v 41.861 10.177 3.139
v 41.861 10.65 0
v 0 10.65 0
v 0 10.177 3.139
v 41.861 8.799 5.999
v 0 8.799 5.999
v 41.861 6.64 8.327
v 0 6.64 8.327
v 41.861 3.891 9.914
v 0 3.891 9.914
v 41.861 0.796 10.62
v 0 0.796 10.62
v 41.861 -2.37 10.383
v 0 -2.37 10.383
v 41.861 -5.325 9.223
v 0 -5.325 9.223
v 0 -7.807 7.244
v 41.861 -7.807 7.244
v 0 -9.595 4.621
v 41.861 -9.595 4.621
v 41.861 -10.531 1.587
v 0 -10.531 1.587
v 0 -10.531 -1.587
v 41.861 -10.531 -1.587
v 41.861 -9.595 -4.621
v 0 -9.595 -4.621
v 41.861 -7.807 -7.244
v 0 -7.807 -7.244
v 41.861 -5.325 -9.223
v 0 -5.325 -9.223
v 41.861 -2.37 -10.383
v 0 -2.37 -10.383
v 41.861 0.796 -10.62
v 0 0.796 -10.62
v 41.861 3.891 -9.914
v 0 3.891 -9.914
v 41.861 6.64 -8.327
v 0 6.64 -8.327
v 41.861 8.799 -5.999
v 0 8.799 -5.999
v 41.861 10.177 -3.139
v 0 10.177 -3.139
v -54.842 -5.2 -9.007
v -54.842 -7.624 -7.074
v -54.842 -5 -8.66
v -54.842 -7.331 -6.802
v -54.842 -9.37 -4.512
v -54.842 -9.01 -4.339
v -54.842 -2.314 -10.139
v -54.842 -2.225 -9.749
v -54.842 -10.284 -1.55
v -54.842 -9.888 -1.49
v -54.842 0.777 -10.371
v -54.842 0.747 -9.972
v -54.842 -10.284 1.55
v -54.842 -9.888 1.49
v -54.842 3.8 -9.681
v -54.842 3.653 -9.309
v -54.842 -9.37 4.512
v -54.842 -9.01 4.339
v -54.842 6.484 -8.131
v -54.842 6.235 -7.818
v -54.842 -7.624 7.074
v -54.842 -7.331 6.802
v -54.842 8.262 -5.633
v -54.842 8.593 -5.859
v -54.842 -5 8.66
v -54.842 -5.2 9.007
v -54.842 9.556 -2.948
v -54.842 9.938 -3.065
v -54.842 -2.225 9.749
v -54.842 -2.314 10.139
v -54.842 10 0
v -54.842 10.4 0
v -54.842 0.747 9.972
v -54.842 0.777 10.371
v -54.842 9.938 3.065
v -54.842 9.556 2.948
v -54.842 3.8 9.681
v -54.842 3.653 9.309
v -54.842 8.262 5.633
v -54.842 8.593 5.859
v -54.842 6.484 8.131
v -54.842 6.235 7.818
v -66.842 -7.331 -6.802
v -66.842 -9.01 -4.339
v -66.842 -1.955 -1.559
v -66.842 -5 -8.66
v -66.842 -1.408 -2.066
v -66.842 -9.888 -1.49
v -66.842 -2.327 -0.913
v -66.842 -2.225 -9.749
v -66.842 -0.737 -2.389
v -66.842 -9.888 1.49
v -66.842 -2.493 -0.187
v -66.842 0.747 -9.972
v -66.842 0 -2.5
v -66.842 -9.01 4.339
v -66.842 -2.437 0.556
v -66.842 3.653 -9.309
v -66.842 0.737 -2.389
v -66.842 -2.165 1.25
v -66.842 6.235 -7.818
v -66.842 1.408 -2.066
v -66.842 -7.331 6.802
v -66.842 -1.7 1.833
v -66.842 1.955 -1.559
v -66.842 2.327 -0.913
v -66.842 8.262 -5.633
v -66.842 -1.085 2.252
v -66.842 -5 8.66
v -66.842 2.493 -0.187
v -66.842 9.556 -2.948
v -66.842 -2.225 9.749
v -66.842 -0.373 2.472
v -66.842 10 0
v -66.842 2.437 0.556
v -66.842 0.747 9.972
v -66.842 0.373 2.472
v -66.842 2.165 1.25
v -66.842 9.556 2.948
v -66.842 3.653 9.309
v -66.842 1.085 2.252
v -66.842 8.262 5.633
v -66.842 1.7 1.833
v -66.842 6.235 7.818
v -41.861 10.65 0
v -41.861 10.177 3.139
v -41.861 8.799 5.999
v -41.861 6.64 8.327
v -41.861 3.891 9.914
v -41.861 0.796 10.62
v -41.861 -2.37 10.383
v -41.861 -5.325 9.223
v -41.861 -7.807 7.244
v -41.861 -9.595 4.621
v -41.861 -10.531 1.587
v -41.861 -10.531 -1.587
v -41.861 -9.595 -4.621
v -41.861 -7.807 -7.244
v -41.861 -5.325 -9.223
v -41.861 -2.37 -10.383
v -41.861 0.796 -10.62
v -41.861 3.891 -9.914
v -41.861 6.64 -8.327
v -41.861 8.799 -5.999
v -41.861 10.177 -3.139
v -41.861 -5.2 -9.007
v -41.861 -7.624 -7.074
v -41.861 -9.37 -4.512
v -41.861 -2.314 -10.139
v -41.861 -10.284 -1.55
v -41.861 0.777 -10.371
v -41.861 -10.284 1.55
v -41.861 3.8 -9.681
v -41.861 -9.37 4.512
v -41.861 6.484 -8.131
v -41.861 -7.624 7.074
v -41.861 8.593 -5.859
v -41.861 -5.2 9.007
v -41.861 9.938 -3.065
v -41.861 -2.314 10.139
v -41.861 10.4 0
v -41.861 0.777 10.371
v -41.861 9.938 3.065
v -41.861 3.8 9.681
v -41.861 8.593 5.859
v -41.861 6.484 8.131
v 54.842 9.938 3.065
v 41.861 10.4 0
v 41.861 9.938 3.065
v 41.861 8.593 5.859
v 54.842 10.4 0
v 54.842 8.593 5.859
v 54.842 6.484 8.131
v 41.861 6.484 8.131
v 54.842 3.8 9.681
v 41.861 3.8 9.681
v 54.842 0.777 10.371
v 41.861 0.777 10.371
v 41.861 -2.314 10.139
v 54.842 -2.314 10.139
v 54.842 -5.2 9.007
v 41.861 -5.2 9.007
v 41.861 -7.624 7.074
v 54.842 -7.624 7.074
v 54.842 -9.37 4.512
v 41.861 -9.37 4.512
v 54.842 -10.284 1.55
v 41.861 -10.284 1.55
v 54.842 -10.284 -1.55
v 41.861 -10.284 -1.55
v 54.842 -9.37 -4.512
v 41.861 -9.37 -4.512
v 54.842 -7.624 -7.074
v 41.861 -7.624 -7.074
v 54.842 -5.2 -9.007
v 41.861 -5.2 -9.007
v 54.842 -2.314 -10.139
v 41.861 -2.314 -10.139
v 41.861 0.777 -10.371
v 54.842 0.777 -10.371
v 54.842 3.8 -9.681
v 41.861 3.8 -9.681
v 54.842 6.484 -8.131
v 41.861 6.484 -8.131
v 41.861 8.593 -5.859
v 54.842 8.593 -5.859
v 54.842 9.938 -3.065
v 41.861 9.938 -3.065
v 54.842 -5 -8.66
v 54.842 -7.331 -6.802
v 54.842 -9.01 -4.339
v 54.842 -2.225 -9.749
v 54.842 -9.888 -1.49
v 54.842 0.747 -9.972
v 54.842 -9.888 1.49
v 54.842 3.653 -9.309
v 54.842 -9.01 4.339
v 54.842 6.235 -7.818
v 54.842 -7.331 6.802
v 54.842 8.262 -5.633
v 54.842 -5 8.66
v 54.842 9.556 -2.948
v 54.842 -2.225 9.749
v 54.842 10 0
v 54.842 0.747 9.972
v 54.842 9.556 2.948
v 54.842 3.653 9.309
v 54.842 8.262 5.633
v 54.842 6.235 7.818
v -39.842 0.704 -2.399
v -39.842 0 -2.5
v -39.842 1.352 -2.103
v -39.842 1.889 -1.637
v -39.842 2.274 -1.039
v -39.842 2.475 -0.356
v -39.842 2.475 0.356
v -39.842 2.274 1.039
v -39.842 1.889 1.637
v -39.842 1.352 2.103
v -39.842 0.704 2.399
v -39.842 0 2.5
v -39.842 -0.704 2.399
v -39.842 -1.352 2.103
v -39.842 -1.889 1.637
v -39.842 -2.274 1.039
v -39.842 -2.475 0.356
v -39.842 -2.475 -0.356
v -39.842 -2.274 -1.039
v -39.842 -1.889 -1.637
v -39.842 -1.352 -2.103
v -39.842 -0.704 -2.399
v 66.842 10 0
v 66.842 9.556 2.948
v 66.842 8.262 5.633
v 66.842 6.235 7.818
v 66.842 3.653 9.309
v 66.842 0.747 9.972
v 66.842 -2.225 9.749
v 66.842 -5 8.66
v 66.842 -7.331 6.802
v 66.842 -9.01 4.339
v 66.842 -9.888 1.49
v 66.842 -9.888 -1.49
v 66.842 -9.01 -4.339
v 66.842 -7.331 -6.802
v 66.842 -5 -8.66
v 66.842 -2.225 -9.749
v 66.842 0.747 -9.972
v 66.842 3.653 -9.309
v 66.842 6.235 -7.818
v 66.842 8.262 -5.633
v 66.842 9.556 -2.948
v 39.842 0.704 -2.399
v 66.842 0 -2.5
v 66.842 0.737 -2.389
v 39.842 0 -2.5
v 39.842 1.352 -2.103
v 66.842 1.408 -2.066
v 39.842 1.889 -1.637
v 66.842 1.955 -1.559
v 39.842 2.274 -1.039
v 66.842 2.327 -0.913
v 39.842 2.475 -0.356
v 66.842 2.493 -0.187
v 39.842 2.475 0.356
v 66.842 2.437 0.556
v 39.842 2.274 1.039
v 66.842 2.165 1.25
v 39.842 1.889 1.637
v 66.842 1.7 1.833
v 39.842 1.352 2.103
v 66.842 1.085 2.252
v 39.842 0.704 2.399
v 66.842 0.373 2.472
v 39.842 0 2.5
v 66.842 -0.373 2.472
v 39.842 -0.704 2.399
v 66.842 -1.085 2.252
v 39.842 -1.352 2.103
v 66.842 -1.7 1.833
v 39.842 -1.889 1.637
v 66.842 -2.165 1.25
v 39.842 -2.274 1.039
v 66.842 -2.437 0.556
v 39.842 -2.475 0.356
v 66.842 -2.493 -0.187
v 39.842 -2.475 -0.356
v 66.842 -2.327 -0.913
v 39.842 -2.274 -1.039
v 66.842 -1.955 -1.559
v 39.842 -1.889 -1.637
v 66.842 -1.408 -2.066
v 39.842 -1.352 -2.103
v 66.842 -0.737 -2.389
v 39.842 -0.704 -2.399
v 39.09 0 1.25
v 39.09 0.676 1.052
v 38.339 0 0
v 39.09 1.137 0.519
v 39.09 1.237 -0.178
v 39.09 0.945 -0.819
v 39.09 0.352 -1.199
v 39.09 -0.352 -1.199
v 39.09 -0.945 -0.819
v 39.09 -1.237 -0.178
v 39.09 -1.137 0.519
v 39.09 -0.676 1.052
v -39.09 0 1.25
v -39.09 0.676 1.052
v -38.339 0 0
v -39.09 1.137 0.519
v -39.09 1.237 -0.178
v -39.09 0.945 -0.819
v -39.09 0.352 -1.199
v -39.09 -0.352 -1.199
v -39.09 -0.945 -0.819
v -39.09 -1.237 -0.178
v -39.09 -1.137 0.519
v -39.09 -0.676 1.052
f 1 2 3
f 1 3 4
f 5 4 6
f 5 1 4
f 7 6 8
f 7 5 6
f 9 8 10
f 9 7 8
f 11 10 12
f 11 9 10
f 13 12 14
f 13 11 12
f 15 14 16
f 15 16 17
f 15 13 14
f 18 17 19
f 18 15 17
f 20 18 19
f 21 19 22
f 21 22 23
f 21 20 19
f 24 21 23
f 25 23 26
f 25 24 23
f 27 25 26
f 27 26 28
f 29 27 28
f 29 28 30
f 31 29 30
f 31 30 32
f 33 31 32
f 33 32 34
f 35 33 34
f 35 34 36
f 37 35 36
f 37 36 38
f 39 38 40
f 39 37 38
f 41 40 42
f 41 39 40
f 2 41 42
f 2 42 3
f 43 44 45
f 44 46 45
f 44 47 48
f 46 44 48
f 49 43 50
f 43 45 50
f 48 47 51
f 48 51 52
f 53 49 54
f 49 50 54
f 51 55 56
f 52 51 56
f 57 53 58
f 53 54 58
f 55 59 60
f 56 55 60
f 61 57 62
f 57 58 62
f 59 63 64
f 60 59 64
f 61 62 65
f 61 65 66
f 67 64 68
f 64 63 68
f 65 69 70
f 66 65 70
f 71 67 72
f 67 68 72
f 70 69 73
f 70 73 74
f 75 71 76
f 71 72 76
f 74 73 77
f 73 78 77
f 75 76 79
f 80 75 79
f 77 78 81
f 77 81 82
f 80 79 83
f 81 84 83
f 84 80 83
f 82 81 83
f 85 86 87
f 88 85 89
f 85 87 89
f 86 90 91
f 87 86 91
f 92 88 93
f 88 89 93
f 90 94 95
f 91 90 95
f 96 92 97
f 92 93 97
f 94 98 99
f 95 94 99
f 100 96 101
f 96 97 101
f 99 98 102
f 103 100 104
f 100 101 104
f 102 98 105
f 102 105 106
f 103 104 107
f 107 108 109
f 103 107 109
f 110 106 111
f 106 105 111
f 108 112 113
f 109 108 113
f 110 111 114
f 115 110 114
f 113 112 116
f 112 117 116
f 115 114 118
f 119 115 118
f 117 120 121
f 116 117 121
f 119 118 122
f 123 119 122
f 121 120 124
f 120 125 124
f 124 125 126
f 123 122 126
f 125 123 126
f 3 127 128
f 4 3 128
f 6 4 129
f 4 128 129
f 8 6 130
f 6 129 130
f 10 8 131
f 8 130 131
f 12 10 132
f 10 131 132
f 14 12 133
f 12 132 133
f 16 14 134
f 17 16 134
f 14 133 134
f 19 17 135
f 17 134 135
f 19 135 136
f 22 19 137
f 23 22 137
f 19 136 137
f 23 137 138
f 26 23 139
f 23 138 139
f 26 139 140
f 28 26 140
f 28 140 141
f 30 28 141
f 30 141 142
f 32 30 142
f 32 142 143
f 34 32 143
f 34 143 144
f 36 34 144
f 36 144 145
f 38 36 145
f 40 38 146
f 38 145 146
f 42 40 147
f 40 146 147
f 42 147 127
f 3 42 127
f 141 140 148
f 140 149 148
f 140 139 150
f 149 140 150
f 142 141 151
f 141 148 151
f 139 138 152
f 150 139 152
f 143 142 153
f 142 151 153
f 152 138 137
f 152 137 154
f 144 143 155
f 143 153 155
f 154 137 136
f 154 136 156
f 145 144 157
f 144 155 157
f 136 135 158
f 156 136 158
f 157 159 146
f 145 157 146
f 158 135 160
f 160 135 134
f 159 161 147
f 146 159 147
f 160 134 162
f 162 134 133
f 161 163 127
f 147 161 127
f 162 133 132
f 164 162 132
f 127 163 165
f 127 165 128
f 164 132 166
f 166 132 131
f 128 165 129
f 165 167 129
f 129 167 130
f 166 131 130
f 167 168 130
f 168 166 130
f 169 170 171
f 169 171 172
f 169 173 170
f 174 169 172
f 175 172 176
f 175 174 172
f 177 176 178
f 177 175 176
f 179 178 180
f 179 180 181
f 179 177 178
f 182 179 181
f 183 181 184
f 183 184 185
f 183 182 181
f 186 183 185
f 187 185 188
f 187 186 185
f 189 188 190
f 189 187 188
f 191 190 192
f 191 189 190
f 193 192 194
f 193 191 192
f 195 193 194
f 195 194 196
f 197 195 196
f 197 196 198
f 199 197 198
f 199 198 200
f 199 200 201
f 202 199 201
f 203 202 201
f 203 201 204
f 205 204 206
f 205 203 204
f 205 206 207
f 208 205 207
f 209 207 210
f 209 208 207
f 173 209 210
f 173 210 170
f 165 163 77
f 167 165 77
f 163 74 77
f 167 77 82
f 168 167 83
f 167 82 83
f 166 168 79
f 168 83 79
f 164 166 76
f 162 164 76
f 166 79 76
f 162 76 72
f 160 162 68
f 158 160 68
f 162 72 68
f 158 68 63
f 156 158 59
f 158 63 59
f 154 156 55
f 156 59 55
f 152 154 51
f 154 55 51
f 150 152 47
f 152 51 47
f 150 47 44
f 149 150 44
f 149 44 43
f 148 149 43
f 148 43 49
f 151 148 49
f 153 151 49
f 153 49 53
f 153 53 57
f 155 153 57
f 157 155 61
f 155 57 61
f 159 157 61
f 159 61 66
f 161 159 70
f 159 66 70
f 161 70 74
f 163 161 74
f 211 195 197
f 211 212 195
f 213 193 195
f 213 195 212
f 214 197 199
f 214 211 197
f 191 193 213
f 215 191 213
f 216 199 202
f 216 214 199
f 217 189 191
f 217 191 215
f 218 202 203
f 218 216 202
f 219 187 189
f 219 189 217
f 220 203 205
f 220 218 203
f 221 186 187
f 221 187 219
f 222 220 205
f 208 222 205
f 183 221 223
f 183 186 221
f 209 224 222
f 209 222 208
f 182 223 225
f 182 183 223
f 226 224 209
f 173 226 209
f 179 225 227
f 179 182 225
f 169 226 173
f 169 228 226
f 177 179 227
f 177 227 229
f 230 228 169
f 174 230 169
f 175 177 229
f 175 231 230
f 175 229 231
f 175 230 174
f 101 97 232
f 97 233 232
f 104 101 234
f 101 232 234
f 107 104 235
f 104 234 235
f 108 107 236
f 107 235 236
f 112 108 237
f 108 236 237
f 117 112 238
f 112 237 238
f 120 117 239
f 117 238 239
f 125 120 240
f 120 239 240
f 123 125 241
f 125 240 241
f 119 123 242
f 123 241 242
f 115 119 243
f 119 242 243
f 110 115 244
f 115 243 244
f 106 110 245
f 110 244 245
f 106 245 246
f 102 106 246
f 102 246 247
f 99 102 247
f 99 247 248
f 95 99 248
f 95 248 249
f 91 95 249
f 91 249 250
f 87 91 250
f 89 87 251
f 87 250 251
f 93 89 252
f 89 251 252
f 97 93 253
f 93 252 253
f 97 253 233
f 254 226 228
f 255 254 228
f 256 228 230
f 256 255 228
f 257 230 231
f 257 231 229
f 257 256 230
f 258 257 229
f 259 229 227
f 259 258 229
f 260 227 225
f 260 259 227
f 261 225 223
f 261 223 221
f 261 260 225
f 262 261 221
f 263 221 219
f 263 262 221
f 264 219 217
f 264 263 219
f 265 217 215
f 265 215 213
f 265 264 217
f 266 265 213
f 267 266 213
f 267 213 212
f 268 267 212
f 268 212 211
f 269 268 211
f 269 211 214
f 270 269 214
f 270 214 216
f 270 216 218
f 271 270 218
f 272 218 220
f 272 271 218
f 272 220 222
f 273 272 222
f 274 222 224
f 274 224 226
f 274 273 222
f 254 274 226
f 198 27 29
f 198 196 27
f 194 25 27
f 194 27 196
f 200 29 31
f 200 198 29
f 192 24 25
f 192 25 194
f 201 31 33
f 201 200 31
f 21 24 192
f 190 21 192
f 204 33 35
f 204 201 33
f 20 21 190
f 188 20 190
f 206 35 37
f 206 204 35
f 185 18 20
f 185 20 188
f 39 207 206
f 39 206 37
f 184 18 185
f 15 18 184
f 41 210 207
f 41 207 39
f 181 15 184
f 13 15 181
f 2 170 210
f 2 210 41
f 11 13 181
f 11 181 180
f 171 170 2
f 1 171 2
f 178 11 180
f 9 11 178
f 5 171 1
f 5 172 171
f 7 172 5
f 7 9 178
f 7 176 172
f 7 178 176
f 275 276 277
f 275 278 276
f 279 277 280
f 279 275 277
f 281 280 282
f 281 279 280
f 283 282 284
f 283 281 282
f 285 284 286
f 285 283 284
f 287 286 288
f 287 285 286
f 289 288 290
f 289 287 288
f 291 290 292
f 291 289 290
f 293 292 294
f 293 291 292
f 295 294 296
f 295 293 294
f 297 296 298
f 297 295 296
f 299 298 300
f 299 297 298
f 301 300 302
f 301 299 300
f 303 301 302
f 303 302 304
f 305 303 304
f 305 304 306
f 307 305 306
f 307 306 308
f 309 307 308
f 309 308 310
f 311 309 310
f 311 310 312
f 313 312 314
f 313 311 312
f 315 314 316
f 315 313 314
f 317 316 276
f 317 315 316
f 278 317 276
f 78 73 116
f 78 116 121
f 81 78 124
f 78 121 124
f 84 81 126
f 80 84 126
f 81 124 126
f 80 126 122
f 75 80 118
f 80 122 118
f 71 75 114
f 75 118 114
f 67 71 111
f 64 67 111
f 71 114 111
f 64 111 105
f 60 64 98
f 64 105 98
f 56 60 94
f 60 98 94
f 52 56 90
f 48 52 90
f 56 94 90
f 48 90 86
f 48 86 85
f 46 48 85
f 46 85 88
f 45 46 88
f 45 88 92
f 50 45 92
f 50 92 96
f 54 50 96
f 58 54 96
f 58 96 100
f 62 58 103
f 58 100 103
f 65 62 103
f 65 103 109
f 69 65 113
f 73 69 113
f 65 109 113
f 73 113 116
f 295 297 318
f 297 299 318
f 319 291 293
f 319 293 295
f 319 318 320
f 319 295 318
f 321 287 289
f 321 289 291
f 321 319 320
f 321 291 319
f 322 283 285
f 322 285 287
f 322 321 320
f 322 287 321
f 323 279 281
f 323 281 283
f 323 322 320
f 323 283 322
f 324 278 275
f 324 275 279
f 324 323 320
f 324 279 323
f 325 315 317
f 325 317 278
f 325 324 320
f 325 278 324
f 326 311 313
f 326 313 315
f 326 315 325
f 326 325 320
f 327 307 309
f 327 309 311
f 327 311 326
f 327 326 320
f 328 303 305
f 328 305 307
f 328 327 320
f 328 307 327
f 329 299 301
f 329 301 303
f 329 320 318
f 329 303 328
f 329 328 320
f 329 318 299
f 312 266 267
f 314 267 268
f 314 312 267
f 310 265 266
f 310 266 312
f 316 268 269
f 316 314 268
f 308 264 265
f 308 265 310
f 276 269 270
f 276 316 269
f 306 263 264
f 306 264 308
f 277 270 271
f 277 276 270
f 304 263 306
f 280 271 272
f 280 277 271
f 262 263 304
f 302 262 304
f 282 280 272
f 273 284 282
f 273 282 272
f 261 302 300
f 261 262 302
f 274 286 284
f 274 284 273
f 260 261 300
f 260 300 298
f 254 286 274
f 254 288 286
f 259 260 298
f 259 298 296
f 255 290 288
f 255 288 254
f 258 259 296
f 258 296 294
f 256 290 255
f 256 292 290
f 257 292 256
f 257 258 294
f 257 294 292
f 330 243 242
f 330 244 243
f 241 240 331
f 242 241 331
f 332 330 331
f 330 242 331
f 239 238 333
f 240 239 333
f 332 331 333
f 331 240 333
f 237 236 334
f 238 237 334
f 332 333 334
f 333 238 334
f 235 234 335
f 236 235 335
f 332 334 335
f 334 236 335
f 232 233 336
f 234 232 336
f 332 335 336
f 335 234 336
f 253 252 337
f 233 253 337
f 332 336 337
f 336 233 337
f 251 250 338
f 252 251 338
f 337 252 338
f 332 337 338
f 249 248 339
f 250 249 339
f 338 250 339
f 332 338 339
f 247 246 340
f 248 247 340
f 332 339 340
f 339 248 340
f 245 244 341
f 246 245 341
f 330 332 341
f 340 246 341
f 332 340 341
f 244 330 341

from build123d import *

# Parameters (mm, degrees)
HOLE_WIZARD_M61_D     = 5
HOLE_WIZARD_M61_DEPTH = 27
HOLE_WIZARD_M61_TIP   = 1.502151548


with BuildPart() as part:
    # Эскиз1 → Повернуть1 (revolve)
    with BuildSketch(Plane.XY):
        Polygon((0, 0), (0, 10.65), (-41.861372681, 10.65), (-41.861372681, 10.4), (-54.841568778, 10.4), (-54.841568778, 10), (-66.841568778, 10), (-66.841568778, 0), align=None)
    revolve(axis=Axis((-66.841568778, 0, 0), (1, 0, 0)))

    # Отверстие обработанное метчиком M61
    with Locations(Plane.ZY.offset(66.841568778)):
        with Locations((0, 0)):
            Hole(HOLE_WIZARD_M61_D / 2, depth=HOLE_WIZARD_M61_DEPTH)
            with Locations((0, 0, -(HOLE_WIZARD_M61_DEPTH + HOLE_WIZARD_M61_TIP / 2))):  # 118° drill point
                Cone(0, HOLE_WIZARD_M61_D / 2, HOLE_WIZARD_M61_TIP, mode=Mode.SUBTRACT)

    # Зеркальное отражение1: part across plane


with BuildPart() as part_1:
    add(part.part)
    add(part.part.mirror(Plane.ZY))


solid = part_1.part
